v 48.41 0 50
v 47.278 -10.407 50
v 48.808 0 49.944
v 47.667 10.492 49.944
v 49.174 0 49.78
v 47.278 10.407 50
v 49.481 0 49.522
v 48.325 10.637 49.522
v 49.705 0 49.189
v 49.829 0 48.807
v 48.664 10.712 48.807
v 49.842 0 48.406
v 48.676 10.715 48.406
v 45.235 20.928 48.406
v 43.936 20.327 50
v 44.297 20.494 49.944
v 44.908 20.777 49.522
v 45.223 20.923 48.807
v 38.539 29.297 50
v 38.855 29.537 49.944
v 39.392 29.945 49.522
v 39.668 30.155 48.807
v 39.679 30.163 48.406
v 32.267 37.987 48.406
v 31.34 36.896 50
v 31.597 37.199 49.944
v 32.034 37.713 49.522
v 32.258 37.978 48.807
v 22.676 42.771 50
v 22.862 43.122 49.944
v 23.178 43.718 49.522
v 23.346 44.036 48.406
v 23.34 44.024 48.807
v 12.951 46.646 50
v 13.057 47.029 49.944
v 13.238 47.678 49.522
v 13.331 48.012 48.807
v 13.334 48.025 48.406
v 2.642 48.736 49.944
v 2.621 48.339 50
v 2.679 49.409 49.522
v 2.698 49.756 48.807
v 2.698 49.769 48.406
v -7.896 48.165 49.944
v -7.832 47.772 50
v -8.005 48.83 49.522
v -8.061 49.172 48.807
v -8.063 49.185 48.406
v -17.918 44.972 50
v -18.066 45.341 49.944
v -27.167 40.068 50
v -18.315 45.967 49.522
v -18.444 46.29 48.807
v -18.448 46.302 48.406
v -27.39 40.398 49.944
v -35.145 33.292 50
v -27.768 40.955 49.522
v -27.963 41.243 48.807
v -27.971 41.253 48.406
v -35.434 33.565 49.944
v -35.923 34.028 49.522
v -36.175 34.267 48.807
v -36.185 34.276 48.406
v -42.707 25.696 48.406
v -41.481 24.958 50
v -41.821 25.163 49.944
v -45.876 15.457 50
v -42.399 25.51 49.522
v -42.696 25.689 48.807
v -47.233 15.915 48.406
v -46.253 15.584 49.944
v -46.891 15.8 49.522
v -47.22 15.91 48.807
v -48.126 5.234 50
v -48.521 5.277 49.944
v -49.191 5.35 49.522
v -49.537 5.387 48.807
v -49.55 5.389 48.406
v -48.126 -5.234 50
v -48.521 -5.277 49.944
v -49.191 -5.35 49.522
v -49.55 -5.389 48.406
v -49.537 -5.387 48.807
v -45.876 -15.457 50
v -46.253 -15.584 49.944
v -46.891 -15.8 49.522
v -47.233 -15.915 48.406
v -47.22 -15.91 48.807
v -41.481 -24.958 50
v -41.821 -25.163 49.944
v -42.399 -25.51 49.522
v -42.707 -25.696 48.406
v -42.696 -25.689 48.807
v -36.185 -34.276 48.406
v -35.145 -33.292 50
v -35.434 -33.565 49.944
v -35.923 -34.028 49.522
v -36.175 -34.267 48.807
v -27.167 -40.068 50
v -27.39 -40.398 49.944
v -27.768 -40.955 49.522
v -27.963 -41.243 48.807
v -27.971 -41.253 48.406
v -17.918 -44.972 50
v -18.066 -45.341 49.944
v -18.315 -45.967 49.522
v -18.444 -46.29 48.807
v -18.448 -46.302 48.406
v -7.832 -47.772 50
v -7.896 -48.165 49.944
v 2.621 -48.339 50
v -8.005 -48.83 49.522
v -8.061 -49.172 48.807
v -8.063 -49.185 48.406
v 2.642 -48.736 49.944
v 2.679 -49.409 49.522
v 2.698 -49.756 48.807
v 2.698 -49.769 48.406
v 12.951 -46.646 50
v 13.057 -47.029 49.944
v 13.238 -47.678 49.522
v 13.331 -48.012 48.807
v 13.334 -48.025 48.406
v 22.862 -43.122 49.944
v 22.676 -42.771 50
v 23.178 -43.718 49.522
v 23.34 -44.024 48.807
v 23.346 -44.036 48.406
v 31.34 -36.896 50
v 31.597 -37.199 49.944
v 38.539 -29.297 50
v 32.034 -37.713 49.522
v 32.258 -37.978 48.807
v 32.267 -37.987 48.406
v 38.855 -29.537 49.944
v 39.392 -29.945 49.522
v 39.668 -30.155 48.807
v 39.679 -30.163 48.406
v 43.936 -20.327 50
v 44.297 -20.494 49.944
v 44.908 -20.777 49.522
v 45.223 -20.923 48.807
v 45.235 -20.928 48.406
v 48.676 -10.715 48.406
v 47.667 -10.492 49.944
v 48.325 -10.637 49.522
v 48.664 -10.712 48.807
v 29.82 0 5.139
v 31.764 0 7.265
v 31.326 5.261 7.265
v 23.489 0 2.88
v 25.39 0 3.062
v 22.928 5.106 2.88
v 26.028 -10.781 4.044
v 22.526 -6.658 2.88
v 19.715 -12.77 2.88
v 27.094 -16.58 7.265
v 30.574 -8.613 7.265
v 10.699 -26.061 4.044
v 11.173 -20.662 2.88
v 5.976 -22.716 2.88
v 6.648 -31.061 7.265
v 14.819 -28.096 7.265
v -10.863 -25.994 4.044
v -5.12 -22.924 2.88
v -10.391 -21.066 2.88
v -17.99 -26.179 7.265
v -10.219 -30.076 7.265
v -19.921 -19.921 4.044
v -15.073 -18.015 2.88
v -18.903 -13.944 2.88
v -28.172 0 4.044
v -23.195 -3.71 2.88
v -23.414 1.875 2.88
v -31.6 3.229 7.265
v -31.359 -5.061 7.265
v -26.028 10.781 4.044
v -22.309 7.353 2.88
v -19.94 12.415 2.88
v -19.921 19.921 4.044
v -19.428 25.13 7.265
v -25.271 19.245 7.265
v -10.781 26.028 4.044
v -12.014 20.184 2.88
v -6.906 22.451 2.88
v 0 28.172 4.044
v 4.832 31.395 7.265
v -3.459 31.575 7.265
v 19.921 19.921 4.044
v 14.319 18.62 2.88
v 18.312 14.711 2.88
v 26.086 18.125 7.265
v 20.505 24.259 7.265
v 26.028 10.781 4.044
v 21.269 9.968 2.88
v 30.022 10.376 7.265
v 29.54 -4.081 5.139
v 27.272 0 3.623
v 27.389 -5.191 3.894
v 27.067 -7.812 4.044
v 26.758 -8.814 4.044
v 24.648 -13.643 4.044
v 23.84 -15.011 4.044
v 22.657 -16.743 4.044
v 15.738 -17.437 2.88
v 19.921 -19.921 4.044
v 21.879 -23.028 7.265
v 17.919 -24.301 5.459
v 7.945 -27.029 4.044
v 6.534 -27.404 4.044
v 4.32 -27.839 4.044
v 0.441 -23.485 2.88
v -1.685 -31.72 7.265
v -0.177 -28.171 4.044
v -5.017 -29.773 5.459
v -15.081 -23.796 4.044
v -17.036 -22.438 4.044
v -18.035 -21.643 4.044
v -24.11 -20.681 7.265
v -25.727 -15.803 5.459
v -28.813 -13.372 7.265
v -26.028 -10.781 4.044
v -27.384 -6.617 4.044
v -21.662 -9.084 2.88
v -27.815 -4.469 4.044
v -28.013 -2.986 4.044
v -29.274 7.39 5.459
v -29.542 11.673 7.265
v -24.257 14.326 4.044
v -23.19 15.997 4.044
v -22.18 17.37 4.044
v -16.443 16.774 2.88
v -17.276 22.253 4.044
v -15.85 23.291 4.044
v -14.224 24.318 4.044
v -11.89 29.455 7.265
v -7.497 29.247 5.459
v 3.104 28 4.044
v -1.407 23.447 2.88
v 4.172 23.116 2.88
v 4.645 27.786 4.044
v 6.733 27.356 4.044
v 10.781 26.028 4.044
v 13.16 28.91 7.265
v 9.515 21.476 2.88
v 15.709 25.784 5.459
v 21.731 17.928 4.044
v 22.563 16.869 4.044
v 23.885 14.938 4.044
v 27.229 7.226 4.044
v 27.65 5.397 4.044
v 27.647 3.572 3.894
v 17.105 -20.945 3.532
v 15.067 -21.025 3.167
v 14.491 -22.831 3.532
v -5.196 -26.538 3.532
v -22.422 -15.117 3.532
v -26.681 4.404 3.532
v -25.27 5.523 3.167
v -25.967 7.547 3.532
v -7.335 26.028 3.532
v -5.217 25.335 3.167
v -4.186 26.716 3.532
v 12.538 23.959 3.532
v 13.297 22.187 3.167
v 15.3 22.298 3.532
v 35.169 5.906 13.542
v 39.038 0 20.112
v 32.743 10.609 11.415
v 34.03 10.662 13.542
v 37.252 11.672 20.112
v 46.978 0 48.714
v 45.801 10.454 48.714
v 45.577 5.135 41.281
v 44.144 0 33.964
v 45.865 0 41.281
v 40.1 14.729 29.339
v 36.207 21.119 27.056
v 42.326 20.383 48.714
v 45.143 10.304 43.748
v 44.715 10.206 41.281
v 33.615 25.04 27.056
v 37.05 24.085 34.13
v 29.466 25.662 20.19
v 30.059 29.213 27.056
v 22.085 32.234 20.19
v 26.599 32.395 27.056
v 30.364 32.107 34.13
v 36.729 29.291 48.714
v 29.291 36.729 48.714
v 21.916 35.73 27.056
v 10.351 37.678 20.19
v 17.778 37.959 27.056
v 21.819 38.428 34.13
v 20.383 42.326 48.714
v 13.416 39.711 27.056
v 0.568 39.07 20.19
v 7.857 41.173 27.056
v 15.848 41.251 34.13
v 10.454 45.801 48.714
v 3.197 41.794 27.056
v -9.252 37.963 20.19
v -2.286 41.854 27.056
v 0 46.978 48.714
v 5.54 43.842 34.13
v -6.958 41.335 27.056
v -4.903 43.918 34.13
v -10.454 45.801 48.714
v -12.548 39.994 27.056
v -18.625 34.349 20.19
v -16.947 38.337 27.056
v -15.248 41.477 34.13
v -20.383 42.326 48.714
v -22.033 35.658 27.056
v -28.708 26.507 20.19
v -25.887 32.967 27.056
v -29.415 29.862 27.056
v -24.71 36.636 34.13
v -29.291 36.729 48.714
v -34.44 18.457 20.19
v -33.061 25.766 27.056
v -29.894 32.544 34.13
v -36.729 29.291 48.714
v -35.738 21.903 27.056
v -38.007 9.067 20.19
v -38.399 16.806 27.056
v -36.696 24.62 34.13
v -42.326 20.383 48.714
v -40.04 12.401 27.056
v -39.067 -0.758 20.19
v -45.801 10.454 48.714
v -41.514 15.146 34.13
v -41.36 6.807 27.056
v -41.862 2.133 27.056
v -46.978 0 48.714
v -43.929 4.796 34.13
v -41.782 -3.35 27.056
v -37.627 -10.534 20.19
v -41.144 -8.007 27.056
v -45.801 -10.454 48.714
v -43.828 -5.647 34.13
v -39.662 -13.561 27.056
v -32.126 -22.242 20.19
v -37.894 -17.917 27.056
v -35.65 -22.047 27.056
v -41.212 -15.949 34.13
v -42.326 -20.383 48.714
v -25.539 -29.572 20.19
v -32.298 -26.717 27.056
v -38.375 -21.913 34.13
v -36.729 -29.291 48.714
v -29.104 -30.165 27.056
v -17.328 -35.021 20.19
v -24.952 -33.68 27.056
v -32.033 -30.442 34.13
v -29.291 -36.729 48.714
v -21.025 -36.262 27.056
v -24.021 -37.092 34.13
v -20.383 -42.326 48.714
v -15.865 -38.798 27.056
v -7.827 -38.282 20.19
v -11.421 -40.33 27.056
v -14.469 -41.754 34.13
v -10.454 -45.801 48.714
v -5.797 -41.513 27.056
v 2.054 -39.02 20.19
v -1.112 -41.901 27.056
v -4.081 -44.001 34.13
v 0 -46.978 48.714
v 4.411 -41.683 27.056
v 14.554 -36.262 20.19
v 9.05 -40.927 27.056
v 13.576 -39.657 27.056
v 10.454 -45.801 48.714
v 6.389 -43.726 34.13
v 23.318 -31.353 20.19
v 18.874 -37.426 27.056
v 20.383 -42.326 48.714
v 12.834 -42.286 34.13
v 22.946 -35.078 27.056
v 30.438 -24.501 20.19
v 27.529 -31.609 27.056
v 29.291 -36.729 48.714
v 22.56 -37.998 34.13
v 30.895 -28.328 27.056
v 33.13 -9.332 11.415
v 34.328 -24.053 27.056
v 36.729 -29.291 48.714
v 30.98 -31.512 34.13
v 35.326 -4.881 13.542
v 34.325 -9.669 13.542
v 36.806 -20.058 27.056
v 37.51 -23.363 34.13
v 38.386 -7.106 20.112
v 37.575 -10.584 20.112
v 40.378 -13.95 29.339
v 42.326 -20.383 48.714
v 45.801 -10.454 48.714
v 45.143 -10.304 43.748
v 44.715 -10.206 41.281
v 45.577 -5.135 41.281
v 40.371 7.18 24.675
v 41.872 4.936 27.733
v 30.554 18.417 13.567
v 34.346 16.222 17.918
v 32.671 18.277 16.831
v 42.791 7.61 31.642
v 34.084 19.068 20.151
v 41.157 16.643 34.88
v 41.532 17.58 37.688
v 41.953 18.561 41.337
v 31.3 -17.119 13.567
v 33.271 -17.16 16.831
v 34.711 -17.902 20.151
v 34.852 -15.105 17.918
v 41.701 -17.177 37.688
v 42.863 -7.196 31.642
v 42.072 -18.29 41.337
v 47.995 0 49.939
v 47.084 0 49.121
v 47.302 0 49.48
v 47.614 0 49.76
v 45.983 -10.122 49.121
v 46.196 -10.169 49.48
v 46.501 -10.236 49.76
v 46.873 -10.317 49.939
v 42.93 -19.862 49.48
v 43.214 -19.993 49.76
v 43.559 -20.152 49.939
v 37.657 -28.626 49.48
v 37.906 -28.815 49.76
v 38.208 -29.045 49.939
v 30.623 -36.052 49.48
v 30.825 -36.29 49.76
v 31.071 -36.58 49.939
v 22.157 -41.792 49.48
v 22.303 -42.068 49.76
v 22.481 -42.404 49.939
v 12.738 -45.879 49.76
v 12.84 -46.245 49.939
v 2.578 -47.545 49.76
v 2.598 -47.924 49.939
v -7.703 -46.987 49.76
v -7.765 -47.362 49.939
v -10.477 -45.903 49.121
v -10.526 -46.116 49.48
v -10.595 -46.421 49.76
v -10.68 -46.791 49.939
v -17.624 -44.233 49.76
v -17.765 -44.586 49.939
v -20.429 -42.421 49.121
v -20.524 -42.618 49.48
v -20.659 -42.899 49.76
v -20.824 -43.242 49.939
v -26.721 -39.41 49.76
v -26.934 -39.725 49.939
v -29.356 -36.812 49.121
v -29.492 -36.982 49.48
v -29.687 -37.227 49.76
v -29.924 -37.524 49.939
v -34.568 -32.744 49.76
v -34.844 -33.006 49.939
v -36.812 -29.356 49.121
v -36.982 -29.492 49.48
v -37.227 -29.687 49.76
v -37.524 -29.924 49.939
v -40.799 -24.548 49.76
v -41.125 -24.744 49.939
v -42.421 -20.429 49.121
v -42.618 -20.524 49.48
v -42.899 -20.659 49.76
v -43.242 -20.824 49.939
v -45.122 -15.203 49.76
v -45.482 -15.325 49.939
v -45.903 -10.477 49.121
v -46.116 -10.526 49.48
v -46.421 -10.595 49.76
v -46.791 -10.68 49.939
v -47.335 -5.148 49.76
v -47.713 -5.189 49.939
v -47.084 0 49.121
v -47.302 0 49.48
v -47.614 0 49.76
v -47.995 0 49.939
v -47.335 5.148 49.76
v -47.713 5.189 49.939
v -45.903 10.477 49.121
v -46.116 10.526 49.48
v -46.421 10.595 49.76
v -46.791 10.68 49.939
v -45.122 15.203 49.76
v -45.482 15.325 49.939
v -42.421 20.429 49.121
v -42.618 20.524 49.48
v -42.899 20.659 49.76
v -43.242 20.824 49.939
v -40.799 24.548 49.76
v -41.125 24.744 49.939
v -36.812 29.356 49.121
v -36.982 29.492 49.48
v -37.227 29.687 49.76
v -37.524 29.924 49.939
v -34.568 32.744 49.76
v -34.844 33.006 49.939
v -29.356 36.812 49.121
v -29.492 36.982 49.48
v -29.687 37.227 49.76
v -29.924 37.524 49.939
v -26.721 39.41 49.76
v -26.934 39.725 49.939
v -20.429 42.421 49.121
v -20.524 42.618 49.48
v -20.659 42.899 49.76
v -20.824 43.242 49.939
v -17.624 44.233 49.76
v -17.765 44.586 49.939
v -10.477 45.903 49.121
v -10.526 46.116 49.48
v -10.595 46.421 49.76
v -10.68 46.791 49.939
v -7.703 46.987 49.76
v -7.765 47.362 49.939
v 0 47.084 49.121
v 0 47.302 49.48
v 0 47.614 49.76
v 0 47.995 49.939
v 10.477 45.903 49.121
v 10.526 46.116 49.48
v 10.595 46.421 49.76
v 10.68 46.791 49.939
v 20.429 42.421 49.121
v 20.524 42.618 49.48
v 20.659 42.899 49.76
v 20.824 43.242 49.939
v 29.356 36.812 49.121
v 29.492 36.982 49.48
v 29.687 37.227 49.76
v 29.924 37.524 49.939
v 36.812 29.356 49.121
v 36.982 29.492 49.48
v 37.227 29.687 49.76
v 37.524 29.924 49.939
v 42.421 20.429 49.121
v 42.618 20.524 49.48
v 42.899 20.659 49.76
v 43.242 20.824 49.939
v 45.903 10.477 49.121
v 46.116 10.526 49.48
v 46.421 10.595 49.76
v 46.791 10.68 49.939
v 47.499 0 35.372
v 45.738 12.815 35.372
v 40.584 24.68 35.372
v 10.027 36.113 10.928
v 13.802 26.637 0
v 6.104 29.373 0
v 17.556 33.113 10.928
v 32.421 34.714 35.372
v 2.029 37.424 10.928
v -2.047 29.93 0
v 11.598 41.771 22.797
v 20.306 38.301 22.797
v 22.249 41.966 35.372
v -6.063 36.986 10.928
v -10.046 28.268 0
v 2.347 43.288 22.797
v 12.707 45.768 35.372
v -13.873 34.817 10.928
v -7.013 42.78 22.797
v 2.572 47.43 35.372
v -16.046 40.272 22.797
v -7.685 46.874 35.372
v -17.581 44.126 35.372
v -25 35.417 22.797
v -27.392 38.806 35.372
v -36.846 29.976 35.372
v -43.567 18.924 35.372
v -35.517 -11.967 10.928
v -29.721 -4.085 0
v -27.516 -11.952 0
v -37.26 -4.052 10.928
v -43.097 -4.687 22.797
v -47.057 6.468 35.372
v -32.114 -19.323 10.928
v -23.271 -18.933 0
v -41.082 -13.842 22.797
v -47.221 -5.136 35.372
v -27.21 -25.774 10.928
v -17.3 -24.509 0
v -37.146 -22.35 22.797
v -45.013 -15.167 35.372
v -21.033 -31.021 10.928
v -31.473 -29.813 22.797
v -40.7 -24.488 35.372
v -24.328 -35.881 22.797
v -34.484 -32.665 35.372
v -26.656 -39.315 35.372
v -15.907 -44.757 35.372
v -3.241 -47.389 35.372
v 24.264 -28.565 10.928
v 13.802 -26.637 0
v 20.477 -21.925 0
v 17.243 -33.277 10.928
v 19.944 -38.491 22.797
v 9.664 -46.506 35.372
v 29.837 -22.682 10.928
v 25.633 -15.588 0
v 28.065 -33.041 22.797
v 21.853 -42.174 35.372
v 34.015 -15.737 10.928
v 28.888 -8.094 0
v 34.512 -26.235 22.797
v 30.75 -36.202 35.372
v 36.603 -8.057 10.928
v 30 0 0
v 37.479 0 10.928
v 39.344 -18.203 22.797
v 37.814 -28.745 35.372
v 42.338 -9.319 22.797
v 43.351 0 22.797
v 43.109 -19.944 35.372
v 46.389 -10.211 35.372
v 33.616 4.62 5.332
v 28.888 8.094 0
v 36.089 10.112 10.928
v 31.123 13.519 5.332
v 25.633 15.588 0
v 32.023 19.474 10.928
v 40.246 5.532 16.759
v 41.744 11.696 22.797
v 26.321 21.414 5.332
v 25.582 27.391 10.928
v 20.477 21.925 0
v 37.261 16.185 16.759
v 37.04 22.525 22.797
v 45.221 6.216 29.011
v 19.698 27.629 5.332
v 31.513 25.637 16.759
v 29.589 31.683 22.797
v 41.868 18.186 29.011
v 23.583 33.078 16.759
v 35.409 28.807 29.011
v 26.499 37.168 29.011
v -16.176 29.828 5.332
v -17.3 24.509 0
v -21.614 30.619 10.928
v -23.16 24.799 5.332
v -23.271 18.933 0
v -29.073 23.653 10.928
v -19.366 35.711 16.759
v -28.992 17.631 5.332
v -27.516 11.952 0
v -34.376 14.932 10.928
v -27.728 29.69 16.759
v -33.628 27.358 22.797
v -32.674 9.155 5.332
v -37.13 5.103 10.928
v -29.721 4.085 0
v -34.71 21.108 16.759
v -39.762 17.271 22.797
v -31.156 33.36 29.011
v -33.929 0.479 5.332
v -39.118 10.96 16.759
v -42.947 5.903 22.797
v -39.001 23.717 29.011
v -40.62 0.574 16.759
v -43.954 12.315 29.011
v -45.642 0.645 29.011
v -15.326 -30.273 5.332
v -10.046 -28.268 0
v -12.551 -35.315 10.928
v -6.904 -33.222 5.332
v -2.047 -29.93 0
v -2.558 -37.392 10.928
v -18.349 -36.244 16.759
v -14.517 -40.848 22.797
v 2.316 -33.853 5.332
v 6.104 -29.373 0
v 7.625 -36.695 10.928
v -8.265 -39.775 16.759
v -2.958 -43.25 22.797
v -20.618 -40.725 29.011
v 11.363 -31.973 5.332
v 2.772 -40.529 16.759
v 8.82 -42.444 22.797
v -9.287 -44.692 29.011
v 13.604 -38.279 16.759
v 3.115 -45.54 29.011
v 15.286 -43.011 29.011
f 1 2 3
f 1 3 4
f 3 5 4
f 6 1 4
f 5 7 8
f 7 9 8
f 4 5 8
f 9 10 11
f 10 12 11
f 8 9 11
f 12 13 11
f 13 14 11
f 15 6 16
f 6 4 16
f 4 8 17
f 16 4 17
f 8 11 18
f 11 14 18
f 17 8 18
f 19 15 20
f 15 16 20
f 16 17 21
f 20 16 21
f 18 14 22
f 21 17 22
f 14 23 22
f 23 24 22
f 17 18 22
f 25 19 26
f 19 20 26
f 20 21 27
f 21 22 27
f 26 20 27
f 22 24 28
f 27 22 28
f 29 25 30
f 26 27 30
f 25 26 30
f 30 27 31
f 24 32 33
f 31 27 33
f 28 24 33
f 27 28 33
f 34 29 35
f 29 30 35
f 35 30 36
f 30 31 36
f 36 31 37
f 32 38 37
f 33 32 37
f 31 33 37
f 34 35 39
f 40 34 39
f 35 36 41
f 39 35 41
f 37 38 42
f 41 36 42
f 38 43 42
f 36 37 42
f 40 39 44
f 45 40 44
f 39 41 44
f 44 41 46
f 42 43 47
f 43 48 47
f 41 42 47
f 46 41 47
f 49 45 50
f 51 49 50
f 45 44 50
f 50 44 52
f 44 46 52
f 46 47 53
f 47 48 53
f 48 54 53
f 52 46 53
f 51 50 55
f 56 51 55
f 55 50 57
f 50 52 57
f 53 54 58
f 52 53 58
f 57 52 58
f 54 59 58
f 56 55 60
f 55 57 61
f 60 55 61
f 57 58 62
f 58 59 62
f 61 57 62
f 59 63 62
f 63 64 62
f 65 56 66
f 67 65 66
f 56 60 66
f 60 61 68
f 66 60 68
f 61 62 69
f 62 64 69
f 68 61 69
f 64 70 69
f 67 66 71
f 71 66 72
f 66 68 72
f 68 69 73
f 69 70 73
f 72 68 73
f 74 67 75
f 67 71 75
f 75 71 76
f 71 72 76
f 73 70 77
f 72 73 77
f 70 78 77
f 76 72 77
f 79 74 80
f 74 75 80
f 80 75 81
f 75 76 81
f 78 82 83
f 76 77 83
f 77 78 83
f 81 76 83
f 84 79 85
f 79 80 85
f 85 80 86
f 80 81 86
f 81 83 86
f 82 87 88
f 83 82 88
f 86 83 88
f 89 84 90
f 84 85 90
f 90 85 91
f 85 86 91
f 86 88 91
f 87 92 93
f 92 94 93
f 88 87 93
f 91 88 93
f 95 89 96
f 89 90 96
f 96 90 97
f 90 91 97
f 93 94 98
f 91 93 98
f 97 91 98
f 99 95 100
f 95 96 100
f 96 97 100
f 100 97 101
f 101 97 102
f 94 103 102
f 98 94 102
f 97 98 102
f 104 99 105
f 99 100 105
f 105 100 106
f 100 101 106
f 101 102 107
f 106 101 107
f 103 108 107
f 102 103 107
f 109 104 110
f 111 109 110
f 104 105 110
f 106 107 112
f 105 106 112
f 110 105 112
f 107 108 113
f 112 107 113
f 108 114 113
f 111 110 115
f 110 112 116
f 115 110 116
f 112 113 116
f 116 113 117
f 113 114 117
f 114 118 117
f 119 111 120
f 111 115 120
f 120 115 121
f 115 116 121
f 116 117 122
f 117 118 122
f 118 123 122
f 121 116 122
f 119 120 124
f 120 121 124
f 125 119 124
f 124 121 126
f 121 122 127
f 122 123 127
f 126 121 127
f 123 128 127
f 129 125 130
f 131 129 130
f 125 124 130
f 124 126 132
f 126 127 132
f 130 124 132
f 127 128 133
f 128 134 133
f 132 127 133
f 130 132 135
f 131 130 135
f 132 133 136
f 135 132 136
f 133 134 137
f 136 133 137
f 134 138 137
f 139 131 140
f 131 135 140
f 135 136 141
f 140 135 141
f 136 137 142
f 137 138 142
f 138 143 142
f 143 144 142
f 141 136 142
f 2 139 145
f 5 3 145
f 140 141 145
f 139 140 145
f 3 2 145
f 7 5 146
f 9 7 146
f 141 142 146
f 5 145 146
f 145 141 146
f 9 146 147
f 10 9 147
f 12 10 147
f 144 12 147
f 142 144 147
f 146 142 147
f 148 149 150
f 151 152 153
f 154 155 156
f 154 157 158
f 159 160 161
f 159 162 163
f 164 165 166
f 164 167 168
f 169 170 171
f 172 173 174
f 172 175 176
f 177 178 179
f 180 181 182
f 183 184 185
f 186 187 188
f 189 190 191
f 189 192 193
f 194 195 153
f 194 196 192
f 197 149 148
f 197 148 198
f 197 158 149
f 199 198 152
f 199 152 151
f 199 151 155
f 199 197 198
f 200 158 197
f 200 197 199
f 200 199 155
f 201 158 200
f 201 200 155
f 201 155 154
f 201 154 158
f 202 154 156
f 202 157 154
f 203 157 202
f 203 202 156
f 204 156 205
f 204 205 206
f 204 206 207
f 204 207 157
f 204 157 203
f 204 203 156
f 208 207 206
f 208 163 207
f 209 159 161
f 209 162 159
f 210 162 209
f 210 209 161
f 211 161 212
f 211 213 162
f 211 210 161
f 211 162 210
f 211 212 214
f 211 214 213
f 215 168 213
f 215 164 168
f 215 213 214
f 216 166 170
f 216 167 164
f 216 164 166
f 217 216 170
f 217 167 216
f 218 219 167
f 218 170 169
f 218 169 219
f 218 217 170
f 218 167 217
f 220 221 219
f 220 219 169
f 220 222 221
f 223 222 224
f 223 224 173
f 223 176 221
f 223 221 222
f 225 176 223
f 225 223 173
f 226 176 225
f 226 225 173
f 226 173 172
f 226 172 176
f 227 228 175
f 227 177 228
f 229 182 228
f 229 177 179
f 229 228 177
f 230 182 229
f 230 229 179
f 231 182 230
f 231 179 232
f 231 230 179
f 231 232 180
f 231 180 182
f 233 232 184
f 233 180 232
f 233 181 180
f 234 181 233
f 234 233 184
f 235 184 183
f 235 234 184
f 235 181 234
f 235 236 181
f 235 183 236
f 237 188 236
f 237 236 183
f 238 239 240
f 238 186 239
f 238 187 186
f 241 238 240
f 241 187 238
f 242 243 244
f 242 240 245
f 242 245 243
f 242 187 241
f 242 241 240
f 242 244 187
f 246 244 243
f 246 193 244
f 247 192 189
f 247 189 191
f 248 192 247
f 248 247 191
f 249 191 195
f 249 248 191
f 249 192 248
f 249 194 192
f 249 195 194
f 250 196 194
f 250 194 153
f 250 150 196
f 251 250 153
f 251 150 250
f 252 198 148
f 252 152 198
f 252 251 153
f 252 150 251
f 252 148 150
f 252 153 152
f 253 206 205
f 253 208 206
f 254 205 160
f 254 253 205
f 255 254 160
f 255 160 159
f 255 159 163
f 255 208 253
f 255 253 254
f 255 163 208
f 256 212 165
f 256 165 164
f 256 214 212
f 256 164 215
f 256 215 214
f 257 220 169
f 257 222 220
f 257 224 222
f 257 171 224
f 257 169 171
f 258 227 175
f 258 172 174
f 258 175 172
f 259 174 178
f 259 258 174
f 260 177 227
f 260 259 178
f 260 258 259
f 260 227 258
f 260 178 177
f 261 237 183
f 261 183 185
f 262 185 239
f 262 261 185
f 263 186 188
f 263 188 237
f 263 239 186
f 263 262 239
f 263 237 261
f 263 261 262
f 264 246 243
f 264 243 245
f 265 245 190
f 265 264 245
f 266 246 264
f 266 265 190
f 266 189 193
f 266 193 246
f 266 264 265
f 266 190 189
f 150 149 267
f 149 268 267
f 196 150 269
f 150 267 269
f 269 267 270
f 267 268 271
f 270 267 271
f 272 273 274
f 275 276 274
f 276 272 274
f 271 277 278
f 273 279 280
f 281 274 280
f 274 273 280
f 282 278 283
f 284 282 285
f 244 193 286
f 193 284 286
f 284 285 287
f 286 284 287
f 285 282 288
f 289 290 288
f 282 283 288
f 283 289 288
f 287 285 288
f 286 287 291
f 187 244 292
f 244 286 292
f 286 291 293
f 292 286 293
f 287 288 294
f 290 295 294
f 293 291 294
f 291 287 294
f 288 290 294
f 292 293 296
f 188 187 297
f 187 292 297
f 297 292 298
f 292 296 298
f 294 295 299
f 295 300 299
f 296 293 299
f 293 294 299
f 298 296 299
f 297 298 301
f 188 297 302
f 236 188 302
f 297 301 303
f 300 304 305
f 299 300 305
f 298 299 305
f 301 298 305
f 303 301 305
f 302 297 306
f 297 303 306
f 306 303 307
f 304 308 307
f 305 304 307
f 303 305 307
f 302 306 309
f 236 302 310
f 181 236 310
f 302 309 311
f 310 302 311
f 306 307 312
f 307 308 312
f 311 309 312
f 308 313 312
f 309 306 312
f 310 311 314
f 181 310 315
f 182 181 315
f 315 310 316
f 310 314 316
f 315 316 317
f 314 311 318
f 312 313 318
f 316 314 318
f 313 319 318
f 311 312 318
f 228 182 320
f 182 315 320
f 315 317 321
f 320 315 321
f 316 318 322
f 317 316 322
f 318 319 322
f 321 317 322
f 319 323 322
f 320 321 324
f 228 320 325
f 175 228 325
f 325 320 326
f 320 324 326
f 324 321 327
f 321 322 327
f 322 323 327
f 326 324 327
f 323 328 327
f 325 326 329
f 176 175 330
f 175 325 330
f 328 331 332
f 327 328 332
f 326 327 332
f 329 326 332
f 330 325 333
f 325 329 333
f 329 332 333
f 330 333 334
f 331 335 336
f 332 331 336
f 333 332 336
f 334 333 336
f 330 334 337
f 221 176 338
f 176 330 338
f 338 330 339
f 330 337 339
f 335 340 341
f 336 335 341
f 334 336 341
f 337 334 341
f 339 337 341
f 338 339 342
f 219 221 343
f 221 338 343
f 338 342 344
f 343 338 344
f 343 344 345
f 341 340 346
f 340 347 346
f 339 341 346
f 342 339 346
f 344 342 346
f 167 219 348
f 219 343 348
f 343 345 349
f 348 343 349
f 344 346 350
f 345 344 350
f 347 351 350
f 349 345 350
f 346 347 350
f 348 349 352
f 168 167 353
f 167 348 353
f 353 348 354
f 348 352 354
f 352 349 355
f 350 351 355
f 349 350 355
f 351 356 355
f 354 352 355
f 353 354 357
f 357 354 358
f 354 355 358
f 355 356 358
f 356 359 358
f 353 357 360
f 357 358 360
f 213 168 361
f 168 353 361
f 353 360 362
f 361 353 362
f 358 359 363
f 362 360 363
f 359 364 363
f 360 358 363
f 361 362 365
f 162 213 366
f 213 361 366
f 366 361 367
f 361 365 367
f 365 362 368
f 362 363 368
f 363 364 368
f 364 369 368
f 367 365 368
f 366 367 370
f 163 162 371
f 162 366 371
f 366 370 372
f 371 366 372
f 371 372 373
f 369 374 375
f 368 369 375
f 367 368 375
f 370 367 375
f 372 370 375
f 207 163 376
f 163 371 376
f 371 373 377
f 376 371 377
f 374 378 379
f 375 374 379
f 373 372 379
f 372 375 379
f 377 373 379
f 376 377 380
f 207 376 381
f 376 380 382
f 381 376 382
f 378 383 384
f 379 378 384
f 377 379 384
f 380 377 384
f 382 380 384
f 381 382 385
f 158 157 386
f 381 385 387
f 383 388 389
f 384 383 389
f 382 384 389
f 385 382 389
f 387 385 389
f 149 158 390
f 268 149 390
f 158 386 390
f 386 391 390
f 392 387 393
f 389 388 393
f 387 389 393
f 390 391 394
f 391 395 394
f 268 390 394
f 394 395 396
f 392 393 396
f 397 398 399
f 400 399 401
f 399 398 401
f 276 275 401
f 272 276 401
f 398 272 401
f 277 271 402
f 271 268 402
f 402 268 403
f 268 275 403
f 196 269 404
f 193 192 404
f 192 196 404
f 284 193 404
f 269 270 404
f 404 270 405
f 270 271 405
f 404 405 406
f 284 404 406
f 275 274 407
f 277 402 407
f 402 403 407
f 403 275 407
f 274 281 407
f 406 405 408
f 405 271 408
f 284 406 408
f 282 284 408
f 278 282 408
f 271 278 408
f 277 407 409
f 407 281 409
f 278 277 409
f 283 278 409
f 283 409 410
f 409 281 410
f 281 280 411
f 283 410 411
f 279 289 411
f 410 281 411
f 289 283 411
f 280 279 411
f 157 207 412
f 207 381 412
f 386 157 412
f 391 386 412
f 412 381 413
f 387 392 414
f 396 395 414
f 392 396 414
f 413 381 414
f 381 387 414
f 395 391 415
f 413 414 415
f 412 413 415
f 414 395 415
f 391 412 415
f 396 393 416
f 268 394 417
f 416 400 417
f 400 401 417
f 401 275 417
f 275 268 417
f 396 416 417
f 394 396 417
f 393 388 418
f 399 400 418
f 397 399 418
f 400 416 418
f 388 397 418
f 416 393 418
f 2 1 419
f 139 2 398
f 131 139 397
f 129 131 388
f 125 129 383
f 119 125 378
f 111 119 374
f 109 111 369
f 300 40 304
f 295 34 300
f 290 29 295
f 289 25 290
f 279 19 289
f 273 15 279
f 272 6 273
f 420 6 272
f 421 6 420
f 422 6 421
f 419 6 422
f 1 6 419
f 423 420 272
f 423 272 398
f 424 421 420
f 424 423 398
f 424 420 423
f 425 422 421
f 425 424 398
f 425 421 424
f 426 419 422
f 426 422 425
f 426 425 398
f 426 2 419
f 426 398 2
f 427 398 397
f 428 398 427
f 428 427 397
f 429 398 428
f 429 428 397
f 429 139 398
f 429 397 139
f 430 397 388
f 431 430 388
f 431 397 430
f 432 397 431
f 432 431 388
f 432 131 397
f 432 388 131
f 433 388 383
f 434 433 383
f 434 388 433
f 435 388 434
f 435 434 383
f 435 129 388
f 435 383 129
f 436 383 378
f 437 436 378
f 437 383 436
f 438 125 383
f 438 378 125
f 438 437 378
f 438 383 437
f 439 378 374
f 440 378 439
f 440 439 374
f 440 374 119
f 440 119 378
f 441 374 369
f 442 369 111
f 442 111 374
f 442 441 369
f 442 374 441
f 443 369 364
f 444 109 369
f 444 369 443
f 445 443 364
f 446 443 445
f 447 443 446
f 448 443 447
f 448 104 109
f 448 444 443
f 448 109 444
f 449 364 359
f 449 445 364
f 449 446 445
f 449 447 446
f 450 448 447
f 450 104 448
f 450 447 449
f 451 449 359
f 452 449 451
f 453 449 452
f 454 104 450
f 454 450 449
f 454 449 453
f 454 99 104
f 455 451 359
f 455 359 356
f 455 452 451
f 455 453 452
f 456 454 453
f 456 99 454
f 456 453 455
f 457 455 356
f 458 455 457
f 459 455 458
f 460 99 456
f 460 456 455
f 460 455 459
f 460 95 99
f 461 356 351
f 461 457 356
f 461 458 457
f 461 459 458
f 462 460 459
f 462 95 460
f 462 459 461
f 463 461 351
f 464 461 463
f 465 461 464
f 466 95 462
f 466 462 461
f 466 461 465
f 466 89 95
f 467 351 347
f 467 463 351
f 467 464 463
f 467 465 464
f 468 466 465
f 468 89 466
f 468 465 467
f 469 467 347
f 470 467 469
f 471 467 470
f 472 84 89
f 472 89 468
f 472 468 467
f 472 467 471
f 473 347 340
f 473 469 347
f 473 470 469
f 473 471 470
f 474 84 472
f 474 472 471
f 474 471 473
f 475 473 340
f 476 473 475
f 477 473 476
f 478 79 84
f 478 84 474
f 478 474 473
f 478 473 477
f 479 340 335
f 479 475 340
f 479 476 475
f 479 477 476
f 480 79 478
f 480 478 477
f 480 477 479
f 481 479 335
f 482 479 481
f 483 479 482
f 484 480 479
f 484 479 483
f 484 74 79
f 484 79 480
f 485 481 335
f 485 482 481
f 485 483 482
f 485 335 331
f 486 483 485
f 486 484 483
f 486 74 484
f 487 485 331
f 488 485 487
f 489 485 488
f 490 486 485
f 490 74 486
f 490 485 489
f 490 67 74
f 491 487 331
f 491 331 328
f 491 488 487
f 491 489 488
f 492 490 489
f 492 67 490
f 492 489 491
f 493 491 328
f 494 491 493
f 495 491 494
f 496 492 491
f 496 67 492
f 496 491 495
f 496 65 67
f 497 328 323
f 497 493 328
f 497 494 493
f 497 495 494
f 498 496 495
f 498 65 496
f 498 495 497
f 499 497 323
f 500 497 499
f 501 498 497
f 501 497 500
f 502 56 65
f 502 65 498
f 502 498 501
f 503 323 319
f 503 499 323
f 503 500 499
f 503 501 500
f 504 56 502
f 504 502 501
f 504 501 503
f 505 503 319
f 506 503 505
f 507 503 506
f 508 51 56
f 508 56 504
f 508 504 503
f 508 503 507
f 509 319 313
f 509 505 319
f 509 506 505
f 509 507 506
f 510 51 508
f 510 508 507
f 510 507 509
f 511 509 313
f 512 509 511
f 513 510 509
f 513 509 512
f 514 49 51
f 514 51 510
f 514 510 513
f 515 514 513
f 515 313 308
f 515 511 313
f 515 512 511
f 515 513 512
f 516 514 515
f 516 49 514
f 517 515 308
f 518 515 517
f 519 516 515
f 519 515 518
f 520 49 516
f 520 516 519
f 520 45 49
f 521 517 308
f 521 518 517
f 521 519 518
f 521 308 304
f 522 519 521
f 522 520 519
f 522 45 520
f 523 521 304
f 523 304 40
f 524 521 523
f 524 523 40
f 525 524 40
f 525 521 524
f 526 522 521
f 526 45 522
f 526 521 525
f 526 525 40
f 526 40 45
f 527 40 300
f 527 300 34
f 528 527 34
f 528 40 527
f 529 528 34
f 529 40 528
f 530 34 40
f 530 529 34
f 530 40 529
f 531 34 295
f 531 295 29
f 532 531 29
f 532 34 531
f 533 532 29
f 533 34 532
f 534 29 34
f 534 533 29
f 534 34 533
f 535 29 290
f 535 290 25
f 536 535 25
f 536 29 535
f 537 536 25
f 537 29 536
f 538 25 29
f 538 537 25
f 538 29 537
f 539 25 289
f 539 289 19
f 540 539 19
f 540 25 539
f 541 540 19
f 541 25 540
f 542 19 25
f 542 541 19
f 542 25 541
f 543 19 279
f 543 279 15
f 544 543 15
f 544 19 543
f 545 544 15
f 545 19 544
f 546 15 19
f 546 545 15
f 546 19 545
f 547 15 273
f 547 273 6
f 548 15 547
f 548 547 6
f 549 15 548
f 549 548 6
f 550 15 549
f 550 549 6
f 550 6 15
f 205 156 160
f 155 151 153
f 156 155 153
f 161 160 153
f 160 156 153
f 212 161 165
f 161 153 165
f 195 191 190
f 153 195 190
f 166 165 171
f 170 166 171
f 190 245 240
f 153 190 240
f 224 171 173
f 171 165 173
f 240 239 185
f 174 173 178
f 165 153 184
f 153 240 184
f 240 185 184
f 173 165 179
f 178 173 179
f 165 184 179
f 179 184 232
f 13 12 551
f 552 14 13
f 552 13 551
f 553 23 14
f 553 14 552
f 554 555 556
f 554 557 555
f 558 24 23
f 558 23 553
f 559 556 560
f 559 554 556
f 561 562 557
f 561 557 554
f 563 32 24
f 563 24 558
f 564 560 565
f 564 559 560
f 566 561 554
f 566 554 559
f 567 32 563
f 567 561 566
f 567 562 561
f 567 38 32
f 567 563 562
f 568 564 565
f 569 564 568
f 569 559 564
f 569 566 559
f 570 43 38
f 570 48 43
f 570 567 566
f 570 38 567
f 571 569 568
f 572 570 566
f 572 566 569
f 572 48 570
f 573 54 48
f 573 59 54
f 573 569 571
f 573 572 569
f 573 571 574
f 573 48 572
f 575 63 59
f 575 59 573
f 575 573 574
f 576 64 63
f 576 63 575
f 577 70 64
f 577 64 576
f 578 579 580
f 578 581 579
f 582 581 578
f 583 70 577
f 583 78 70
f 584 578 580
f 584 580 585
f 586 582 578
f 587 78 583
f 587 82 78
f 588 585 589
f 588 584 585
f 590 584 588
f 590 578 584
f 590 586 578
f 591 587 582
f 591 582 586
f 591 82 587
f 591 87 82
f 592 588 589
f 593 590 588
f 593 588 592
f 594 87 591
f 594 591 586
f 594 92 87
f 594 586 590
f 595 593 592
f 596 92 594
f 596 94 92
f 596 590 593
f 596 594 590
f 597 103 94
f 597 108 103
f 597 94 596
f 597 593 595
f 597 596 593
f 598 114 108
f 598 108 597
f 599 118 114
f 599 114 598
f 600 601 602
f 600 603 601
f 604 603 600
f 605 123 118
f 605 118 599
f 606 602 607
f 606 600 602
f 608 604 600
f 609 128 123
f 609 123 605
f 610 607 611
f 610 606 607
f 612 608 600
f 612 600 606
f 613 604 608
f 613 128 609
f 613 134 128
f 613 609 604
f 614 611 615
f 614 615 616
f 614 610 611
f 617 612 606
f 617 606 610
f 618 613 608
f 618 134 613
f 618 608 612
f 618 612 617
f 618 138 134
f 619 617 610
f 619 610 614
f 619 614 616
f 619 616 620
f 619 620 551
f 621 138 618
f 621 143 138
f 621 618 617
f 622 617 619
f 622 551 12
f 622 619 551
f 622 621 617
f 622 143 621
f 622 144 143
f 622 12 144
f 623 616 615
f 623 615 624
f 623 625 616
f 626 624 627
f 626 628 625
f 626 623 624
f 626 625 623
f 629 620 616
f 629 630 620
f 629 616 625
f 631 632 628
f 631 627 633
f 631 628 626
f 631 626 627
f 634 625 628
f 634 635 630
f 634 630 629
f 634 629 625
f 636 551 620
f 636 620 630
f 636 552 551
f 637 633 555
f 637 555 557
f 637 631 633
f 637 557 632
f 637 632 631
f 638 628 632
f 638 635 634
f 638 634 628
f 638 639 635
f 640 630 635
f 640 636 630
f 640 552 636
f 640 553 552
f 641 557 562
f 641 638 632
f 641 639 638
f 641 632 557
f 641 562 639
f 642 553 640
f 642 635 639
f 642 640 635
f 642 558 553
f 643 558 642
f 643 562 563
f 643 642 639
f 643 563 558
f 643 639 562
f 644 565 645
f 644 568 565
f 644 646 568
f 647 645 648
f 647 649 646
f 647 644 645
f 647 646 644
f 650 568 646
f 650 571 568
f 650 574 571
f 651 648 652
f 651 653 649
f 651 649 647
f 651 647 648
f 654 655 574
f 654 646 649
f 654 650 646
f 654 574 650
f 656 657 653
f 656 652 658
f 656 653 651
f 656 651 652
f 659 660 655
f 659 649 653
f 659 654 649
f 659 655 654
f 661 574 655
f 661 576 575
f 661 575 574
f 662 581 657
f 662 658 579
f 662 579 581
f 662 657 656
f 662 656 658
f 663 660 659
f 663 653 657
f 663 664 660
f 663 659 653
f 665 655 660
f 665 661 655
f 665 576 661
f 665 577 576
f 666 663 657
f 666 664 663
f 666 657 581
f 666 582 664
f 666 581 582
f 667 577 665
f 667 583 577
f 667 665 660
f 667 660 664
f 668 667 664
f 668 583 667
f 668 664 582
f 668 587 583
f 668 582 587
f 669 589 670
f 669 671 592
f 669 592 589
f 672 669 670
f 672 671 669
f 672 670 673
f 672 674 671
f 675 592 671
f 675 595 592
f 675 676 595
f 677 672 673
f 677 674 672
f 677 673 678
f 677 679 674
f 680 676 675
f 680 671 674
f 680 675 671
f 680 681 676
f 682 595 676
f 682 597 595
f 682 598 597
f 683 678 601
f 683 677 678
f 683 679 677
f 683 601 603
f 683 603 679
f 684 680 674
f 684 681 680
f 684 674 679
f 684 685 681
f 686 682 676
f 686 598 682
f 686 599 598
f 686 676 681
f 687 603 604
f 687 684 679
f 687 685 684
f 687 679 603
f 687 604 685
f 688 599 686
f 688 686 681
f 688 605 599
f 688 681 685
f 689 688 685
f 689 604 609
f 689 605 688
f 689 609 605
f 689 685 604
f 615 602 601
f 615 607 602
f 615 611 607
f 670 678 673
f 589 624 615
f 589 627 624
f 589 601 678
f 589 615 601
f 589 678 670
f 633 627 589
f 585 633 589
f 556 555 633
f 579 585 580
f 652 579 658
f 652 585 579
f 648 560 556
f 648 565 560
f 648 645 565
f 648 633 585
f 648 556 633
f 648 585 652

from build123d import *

# Parameters (mm, degrees)
F3_T = -2.88
F4_R = 10


# Not quite as in the source:
# - a fillet or chamfer that OpenCascade refuses, or shapes differently, is made with other operations: its cross-section is extruded or revolved along the edge and cut away or added


with BuildPart() as f2:
    # F1 (on Front) → F2 (revolve)
    with BuildSketch(Plane.XZ):
        with BuildLine():
            Line((0, 50), (0, 0))
            Line((0, 0), (30, 0))
            ThreePointArc((30, 0), (43.6518375699, 23.5392649721), (50, 50))
            Line((50, 50), (0, 50))
        make_face()
    revolve(axis=Axis((0, 0, 25), (0, 0, 1)))

    # F3
    f3_openings = [f2.faces().sort_by_distance(p)[0] for p in [
        (0, 0, 50),
    ]]
    offset(amount=F3_T, openings=f3_openings)

    # F4
    f4_edges = [f2.edges().sort_by_distance(p)[0] for p in [
        (-28.595074, 0, 2.88),
    ]]
    fillet(f4_edges, radius=F4_R)

    # F5: fillet of radius 1.44 on 2 edges, made by hand

    # F5_s1 → F5_t2 (revolve, cut)
    with BuildSketch(Plane.XZ):
        with BuildLine():
            ThreePointArc((48.4100641855, 50), (49.4814986652, 49.5220957102), (49.8417621254, 48.4055946606))
            ThreePointArc((49.8417621254, 48.4055946606), (49.9242734615, 49.2024606493), (50, 50))
            Line((50, 50), (48.4100641855, 50))
        make_face()
    revolve(axis=Axis((0, 0, 50), (0, 0, 1)), mode=Mode.SUBTRACT)

    # F5_s3 → F5_t4 (revolve, cut)
    with BuildSketch(Plane.XZ):
        with BuildLine():
            ThreePointArc((46.9783662426, 48.7144053403), (47.4479684725, 49.63143448), (48.4100641824, 50))
            Line((48.4100641824, 50), (47.1078138243, 50))
            ThreePointArc((47.1078138243, 50), (47.0453655077, 49.3569735508), (46.9783662426, 48.7144053403))
        make_face()
    revolve(axis=Axis((-1.2e-09, -1e-10, 50), (0, 0, -1)), mode=Mode.SUBTRACT)


solid = f2.part
